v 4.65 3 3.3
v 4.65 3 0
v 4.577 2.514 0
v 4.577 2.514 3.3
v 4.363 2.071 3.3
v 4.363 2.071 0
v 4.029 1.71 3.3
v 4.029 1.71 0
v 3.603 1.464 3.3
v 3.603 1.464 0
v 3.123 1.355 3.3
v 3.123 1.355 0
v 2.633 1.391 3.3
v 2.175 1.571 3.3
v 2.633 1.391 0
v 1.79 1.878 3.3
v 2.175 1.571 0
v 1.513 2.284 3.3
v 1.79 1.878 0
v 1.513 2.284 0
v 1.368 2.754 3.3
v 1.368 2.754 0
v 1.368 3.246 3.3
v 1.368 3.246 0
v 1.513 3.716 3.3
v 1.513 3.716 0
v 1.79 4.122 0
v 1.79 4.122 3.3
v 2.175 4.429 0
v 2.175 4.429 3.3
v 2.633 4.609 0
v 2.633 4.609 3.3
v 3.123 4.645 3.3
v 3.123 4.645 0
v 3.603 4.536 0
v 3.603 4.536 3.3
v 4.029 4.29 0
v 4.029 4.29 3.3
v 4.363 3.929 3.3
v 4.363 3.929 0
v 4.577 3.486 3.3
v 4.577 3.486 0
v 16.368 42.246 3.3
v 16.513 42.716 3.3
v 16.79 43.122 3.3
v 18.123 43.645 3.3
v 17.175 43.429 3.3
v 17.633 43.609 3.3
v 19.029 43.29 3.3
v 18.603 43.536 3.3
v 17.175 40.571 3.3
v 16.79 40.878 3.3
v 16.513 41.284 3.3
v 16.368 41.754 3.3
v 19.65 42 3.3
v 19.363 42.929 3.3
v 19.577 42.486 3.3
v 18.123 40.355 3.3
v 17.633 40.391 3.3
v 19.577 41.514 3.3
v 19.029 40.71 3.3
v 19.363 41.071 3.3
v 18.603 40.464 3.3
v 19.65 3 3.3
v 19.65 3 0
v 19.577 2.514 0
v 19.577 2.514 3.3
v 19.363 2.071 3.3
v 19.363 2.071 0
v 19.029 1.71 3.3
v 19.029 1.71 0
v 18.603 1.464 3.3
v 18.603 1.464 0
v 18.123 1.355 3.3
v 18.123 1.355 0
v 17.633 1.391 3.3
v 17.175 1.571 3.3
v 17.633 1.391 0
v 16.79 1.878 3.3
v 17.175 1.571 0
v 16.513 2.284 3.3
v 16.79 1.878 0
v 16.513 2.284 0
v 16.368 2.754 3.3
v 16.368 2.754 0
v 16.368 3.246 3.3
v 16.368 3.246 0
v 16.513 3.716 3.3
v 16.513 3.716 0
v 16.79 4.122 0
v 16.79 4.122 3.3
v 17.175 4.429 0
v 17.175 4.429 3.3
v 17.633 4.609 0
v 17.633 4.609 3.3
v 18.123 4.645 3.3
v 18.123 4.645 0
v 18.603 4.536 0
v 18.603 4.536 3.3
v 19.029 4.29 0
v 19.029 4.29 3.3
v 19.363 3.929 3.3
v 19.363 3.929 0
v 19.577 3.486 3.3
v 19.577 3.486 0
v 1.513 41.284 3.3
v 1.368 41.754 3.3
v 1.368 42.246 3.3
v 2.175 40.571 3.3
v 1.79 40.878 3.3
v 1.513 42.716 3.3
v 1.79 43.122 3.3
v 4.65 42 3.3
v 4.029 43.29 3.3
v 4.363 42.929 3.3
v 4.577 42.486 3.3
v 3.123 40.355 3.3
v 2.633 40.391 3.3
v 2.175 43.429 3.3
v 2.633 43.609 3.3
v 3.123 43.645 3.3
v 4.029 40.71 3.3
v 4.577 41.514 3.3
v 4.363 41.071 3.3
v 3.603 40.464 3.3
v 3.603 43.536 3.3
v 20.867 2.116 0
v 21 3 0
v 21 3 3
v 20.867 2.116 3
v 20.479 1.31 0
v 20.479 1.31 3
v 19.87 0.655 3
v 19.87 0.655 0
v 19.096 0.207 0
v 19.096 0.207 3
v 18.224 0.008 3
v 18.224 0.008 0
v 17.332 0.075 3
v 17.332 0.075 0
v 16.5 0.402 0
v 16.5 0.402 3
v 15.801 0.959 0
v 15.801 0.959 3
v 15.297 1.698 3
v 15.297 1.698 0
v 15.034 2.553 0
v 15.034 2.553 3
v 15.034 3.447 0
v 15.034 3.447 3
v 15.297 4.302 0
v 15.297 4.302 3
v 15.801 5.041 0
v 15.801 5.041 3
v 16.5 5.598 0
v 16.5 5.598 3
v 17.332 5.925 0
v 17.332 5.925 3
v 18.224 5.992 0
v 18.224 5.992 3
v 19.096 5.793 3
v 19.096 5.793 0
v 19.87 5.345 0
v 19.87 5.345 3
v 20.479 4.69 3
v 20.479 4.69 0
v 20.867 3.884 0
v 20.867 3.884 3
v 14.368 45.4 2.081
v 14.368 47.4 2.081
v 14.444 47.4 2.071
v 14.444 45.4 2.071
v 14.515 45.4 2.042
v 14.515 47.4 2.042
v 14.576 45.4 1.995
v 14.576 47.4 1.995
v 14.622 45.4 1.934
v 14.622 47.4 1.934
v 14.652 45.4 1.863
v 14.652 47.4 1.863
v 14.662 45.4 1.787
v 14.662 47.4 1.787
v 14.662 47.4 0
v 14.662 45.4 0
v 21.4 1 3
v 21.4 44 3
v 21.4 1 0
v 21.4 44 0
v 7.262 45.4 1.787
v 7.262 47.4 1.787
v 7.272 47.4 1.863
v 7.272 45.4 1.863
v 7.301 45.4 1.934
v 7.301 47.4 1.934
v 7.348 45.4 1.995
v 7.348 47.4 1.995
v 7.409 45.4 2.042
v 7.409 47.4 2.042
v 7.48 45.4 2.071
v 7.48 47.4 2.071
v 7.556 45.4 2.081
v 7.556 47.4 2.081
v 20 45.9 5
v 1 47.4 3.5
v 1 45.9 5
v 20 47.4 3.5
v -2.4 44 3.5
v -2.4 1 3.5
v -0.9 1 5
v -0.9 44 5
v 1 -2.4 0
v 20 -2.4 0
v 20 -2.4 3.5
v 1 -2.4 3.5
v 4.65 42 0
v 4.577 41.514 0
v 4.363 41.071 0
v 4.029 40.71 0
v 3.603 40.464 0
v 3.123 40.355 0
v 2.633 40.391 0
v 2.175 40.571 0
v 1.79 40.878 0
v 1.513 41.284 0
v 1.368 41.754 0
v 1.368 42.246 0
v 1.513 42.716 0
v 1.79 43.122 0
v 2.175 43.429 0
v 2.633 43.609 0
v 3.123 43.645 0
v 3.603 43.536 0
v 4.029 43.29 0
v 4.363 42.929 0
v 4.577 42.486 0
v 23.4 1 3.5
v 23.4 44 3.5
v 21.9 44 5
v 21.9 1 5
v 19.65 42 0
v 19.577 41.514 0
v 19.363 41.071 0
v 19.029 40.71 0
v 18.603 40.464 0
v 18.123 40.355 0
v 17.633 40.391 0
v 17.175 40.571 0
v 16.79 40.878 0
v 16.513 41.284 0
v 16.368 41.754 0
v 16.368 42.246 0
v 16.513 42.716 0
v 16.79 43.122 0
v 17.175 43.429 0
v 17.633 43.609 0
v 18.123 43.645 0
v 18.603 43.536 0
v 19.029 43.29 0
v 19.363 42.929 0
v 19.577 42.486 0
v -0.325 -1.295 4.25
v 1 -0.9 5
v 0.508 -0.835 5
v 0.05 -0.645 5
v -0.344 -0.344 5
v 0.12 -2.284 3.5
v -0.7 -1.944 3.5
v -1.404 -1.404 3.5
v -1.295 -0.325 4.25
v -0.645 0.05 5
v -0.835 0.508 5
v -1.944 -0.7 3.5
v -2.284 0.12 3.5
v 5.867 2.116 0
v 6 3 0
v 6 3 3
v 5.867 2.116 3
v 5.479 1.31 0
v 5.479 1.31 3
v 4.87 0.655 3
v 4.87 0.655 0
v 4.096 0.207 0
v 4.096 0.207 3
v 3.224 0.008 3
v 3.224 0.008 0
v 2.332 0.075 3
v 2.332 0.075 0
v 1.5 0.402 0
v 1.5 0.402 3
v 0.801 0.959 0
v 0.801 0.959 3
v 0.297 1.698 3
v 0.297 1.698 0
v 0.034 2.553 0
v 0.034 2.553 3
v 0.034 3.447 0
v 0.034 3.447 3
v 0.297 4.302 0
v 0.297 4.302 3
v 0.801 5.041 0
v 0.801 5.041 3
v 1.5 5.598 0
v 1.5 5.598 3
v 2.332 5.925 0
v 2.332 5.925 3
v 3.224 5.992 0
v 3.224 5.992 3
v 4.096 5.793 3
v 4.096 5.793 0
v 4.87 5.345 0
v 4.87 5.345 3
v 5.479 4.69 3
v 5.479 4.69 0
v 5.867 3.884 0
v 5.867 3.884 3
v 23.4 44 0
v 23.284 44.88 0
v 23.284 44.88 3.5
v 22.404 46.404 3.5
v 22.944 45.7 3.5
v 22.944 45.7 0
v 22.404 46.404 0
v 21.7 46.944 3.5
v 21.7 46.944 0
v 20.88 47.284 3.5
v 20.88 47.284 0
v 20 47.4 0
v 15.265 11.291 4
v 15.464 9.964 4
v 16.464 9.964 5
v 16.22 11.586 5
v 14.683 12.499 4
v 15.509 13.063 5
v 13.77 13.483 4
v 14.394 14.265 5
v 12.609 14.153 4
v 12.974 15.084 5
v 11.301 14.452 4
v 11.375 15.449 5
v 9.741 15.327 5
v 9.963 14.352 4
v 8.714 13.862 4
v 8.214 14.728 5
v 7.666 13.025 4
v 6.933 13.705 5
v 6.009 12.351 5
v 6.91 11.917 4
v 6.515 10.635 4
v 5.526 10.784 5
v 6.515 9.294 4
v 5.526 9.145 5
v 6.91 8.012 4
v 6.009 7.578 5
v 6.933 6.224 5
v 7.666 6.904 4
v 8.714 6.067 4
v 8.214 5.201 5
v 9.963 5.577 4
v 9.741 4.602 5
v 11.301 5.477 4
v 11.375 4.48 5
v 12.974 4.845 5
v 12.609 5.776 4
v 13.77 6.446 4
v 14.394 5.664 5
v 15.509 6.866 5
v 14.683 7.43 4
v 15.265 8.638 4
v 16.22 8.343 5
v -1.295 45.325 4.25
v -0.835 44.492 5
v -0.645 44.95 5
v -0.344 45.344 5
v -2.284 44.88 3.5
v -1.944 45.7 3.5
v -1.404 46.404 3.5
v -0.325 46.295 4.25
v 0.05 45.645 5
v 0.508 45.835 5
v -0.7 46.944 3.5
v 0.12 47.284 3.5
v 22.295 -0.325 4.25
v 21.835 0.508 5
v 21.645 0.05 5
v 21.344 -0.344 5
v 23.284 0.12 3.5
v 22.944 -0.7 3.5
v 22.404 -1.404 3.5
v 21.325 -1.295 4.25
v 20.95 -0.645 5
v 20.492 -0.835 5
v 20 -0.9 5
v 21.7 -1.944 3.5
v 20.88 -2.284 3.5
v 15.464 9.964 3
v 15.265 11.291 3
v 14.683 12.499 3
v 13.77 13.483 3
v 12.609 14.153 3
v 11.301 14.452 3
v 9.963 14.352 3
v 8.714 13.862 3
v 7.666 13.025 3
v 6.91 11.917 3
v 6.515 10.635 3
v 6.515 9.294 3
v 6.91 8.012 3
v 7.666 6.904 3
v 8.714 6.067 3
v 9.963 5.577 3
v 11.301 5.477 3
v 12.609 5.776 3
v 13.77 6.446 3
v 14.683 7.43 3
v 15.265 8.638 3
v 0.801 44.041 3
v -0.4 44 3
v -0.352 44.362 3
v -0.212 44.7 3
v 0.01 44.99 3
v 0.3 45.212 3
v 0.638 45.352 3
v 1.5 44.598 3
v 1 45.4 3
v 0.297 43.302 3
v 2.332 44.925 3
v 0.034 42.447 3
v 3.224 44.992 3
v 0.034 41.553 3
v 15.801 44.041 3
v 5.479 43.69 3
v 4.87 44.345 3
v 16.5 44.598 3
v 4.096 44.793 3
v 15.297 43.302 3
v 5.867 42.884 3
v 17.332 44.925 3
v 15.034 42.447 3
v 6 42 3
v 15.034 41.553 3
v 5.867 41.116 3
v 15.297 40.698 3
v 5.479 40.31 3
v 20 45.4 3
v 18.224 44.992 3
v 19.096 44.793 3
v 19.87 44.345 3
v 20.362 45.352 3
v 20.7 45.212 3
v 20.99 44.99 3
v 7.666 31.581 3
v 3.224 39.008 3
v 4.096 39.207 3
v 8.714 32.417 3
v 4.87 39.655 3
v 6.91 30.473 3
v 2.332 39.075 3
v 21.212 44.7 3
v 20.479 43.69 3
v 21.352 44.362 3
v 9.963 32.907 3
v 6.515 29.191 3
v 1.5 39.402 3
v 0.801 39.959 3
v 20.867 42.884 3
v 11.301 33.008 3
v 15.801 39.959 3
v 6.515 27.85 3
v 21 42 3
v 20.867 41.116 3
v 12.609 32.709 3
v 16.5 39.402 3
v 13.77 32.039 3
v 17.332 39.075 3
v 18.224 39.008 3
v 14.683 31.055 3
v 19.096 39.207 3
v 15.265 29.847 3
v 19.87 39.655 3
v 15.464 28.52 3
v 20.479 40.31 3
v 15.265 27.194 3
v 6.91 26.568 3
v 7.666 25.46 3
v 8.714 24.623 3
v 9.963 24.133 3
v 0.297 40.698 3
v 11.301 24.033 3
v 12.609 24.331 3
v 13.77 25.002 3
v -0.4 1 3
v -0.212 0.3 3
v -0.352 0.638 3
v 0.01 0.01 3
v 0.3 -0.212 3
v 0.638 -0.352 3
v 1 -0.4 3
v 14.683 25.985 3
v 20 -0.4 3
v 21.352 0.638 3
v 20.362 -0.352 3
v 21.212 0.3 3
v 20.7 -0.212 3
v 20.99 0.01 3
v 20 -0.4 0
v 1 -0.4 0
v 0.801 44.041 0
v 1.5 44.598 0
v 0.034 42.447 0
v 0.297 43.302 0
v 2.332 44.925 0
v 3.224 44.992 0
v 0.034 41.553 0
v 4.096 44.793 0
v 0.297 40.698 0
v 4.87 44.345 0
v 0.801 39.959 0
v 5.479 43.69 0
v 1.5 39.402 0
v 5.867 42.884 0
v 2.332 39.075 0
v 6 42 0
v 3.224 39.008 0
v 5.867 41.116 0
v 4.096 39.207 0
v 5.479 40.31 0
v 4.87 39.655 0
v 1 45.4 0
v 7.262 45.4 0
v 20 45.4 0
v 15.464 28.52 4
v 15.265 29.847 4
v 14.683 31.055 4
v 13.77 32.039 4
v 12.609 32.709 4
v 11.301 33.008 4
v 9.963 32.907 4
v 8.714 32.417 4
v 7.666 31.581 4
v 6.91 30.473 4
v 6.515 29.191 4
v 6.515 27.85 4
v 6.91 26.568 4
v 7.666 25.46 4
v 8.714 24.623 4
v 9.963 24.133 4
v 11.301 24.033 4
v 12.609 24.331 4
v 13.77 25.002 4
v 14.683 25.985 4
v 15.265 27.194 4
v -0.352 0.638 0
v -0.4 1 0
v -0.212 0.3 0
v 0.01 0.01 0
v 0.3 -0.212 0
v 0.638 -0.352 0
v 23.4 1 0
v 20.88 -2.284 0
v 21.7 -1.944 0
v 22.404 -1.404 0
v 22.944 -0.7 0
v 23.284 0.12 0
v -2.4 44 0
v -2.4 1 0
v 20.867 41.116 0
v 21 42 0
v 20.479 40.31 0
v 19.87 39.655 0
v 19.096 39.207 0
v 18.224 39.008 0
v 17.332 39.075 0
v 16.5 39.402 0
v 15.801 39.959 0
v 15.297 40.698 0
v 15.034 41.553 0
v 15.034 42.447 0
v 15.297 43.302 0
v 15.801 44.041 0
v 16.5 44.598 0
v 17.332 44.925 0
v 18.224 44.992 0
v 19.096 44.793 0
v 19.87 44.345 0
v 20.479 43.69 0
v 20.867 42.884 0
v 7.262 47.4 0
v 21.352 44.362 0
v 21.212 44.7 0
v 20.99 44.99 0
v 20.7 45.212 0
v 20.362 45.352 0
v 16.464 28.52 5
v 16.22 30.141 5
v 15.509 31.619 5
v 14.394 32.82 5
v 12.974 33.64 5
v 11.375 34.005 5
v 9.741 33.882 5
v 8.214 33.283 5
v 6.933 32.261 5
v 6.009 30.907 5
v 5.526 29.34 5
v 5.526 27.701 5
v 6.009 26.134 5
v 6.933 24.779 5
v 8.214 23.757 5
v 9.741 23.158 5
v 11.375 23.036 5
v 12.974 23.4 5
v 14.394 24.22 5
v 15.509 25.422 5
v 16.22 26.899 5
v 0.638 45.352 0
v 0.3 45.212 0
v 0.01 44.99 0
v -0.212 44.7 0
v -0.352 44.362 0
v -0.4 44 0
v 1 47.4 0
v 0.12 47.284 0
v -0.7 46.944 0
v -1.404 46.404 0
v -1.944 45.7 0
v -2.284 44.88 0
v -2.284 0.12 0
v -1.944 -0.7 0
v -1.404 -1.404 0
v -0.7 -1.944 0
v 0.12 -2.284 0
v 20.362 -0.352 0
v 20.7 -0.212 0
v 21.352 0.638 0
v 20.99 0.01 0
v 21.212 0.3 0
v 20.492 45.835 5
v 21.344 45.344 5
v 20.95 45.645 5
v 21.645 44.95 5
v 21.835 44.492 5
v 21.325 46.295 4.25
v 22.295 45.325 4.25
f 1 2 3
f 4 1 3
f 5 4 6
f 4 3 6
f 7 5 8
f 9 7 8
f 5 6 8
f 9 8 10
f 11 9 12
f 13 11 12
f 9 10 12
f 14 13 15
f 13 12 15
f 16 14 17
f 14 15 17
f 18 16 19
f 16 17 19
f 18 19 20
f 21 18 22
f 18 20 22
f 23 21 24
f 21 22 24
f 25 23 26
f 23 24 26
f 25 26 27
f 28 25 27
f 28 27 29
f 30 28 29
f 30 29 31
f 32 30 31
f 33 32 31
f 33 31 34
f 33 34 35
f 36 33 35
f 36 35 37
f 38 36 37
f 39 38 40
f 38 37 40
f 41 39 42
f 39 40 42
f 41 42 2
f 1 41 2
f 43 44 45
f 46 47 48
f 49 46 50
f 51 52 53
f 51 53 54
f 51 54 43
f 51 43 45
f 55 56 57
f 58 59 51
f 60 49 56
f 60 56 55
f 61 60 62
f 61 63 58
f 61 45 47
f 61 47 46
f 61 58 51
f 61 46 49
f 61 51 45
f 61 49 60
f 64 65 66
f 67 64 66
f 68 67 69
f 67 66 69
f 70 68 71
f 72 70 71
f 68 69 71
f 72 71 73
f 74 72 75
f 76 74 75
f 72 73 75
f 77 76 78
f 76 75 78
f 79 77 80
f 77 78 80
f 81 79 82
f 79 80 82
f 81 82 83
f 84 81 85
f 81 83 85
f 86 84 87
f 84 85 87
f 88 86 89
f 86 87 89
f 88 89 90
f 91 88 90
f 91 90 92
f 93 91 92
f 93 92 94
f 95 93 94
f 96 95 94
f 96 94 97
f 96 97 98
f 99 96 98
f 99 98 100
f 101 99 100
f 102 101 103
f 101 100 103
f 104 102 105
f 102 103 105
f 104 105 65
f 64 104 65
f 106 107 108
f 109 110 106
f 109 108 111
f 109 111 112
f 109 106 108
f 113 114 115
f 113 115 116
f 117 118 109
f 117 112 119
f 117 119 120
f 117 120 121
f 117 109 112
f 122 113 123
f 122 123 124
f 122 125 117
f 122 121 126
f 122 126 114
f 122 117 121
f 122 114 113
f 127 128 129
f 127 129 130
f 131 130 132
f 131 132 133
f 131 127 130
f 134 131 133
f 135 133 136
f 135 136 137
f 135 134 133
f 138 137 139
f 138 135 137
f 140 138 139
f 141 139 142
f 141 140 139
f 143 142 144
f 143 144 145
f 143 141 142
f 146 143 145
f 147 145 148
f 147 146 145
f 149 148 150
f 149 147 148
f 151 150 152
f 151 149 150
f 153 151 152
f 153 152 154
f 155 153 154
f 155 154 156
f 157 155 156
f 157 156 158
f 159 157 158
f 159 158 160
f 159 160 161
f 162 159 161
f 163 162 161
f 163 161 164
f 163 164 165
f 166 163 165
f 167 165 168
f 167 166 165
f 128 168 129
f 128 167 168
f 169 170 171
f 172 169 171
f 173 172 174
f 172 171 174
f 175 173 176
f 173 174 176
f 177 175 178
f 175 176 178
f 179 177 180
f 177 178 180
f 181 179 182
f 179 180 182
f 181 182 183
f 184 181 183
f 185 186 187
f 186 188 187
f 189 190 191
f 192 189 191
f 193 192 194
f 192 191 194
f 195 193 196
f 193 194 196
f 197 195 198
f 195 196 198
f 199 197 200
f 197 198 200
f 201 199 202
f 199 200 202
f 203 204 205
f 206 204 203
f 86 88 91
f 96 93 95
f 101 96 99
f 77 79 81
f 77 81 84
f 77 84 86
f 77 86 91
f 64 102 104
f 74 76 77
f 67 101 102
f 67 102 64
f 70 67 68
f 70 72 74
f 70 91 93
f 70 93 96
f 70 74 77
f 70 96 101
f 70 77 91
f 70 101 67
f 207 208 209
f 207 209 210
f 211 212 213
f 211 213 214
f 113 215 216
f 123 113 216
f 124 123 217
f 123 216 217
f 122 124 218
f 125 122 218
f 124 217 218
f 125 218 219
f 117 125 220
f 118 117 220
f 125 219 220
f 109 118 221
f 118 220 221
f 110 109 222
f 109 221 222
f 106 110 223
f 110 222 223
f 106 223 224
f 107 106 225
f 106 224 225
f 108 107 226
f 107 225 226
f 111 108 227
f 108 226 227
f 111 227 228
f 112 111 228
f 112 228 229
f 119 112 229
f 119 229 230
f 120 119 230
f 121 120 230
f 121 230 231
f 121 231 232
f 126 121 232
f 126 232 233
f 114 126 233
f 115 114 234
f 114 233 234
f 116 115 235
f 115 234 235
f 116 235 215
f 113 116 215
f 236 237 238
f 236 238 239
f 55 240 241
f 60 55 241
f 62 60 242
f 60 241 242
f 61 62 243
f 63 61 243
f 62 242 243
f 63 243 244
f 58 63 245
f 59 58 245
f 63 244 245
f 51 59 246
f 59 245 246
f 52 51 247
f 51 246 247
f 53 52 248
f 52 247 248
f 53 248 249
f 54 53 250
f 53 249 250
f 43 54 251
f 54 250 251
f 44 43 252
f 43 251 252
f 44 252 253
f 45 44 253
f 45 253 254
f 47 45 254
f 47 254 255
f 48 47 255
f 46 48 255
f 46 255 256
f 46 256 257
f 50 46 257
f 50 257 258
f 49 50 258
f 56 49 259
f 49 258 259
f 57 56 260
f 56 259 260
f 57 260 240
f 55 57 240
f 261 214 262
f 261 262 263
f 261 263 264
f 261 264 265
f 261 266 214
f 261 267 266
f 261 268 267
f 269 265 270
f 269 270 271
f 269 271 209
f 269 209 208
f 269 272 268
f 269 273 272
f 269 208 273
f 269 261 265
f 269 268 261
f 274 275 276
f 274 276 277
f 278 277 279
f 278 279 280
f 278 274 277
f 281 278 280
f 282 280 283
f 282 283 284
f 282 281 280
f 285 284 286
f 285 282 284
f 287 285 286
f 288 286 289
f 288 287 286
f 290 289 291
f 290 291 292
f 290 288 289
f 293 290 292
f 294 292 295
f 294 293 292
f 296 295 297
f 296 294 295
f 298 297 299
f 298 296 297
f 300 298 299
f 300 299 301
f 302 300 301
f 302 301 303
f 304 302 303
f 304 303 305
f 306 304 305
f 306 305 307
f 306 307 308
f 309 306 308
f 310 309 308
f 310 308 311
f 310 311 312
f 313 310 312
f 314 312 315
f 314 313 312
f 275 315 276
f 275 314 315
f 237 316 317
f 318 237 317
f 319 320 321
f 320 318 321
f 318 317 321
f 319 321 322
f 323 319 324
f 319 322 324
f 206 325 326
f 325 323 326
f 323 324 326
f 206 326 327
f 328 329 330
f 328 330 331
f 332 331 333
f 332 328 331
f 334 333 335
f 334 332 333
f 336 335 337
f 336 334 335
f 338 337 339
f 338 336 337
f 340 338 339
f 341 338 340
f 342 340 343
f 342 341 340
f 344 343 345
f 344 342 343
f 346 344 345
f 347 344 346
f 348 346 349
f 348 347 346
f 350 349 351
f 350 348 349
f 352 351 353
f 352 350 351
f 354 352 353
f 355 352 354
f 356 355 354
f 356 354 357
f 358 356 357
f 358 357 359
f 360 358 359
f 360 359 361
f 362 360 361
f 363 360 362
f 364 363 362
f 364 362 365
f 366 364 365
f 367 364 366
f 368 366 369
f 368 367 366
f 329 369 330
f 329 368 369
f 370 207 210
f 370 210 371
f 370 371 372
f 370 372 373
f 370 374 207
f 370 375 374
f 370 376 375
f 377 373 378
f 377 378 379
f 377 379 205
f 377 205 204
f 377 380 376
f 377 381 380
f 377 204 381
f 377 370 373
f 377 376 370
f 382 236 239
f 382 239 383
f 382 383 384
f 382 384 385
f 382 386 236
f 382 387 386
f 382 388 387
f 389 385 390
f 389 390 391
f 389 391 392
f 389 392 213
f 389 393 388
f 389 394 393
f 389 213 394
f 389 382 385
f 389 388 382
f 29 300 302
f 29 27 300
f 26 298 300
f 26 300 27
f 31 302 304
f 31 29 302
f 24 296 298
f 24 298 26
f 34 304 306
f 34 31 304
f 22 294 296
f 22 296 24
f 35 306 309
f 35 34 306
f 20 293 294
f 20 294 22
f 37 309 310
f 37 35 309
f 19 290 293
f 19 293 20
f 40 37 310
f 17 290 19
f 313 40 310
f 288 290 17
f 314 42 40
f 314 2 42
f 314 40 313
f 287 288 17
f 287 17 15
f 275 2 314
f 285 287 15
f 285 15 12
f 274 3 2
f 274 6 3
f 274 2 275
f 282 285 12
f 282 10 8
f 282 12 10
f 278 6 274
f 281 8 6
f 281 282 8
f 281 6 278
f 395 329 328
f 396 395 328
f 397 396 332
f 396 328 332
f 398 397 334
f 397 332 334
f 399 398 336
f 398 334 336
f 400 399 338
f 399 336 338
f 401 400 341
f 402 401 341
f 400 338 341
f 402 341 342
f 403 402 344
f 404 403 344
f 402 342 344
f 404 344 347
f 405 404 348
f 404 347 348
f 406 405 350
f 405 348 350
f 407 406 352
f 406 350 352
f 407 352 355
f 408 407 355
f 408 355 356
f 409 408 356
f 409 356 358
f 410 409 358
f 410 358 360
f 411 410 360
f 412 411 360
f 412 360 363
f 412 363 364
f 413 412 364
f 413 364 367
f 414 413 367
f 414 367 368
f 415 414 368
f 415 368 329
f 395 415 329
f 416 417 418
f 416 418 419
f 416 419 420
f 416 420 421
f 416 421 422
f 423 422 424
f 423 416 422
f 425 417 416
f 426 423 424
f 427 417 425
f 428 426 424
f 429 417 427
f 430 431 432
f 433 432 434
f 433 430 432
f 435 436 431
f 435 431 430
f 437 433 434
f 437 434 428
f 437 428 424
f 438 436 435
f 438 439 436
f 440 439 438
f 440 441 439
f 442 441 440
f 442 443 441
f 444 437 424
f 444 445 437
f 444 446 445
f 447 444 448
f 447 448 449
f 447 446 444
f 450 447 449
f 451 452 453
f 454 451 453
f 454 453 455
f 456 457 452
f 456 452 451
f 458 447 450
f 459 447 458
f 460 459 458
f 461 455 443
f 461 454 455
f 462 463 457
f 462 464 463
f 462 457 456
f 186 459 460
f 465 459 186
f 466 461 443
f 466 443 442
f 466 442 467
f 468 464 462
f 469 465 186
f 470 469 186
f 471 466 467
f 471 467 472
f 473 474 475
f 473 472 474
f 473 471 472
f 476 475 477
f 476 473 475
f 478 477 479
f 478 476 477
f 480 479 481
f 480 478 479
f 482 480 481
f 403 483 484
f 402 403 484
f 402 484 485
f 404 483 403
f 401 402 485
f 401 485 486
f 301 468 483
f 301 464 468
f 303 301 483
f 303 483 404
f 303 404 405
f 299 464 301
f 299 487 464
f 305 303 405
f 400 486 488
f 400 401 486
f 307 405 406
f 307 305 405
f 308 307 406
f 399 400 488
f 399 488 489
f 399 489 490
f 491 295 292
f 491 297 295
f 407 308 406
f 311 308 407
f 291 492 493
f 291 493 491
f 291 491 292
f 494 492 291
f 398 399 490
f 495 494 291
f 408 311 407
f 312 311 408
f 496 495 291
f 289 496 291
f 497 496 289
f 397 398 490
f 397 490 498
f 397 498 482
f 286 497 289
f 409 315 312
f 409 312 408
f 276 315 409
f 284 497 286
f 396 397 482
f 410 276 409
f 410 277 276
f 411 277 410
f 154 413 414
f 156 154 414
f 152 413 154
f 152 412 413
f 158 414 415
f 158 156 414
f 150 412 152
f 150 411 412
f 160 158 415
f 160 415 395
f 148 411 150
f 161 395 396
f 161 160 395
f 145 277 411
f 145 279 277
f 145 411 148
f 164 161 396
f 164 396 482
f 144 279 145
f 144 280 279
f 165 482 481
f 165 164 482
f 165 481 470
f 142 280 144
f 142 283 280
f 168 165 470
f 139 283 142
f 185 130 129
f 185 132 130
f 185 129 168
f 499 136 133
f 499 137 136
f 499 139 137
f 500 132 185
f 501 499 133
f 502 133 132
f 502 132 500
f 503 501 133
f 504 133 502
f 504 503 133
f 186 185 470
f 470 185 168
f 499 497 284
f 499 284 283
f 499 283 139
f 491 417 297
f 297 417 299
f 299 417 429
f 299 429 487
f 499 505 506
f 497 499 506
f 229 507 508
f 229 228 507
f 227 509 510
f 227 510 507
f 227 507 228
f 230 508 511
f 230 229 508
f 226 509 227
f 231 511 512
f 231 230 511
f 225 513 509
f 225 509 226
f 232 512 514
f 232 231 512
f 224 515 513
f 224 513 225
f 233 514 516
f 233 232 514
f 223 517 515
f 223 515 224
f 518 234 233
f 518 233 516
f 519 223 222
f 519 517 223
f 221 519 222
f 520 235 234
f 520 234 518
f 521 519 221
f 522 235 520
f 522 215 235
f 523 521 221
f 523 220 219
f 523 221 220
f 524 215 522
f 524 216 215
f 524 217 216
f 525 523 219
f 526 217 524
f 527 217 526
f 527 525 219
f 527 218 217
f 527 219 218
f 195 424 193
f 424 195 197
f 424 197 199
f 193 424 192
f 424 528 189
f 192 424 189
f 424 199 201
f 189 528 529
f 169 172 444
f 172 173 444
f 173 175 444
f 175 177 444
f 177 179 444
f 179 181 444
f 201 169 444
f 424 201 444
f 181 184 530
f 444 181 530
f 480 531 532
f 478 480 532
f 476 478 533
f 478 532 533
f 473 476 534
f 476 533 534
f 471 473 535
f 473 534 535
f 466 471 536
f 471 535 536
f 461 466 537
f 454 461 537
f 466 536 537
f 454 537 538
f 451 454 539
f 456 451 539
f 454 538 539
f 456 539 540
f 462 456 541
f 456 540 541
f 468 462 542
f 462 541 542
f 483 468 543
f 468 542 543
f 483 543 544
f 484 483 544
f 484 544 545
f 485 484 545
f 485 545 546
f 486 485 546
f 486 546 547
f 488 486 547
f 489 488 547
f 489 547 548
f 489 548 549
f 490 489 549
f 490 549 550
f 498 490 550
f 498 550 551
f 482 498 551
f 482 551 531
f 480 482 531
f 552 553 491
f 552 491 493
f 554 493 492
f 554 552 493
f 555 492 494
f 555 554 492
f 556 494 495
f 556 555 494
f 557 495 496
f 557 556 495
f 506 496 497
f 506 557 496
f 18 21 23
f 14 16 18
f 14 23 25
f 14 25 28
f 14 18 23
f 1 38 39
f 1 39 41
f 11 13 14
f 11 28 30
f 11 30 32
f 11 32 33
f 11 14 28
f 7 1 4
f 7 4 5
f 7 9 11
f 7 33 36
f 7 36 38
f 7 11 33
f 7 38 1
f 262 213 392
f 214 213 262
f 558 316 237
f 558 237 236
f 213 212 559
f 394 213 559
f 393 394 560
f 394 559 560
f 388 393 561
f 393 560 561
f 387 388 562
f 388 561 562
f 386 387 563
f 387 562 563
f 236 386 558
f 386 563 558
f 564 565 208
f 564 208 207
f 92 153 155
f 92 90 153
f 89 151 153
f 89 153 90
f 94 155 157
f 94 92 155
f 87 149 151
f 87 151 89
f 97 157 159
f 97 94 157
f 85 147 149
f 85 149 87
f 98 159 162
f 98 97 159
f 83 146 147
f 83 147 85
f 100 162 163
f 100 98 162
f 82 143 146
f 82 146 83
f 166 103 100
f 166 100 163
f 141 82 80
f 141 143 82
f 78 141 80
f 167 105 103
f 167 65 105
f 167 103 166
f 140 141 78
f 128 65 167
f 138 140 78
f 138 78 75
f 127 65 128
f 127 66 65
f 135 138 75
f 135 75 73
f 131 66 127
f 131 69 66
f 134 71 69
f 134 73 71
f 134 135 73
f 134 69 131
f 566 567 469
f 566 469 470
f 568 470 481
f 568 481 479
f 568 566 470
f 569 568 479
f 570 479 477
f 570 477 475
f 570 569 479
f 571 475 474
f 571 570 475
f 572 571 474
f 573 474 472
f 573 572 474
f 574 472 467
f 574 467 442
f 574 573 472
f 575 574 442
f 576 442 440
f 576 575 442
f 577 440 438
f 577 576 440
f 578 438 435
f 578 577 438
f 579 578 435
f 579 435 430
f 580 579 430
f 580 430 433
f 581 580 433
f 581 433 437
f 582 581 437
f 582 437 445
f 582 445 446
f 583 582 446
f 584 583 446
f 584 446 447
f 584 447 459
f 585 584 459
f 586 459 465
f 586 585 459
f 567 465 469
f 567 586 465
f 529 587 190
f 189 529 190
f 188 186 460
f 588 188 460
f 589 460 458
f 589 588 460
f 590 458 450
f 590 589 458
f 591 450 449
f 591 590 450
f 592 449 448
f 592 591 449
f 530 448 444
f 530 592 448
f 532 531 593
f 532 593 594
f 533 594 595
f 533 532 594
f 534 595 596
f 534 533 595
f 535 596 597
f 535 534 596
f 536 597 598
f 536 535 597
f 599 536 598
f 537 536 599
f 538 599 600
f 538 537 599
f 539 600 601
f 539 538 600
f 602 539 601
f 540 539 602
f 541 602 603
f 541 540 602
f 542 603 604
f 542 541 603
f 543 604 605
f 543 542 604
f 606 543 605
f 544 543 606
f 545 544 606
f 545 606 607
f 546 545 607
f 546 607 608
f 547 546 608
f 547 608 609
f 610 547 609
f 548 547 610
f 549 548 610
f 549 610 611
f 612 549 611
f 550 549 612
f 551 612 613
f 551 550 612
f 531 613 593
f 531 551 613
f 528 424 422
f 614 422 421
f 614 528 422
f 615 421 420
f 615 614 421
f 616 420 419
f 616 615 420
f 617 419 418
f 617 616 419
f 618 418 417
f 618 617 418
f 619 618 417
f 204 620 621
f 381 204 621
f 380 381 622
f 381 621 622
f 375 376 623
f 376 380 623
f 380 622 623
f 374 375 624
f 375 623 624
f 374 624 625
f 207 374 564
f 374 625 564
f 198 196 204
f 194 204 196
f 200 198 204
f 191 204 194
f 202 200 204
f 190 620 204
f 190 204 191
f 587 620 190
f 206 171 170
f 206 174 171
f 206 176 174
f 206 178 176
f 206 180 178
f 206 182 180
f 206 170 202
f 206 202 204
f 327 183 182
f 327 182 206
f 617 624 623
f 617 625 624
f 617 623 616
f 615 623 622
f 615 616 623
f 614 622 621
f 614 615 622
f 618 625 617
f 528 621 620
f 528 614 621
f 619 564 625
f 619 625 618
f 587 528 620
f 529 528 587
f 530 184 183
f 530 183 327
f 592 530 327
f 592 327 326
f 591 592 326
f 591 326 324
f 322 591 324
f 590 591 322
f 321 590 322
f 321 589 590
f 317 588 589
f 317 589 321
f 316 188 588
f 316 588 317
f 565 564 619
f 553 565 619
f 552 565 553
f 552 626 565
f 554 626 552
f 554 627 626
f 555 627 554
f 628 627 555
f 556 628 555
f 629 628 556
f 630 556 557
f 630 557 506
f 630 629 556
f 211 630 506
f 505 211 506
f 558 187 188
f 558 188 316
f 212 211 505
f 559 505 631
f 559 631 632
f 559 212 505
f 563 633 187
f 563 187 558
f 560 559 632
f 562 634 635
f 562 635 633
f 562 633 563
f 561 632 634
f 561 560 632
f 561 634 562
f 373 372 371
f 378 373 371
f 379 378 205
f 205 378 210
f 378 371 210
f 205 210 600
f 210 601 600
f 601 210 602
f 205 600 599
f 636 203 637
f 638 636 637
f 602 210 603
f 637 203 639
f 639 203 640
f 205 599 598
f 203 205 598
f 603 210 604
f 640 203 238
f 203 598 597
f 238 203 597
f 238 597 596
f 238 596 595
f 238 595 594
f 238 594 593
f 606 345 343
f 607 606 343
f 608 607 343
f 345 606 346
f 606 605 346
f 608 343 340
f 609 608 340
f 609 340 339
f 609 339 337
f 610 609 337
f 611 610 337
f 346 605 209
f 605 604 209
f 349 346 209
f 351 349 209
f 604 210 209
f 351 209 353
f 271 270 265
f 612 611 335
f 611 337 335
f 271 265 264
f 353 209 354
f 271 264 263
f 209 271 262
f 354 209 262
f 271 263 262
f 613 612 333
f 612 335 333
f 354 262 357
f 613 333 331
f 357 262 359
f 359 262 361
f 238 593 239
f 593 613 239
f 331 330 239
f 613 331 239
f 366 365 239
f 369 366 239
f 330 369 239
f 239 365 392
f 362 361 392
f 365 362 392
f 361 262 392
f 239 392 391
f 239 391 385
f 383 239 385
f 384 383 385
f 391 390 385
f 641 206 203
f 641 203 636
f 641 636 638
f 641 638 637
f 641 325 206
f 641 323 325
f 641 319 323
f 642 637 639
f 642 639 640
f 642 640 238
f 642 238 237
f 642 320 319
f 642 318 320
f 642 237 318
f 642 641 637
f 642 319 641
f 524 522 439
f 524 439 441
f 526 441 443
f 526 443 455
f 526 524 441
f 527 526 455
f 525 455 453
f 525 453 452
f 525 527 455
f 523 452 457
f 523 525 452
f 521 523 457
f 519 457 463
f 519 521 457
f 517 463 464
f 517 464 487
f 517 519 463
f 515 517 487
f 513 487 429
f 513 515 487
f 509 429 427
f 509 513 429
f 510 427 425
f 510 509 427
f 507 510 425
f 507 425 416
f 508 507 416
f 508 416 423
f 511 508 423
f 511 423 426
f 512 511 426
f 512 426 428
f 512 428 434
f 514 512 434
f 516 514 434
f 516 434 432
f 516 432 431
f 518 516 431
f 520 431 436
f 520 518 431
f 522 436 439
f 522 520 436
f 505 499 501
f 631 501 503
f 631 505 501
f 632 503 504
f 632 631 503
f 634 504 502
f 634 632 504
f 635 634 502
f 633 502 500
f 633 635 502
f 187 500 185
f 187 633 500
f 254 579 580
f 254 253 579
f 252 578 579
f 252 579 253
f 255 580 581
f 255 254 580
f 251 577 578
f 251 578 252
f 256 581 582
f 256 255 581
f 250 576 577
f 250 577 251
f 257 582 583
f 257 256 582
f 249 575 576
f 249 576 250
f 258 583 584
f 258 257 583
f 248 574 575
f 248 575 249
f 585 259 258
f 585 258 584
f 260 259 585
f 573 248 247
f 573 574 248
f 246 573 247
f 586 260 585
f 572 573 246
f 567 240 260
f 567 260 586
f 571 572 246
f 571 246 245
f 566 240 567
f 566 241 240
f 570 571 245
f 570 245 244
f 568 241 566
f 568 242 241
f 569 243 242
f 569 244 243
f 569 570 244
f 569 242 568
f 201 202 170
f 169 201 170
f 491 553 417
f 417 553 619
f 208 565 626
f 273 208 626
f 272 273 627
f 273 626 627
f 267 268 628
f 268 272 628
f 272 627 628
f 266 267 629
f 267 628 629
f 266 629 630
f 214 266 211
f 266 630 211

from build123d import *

# Parameters (mm, degrees)
PAD014_DEPTH    = 5
THICKNESS001_T  = -2
SKETCH029_R     = 4.5
POCKET011_DEPTH = 5.001
SKETCH030_R     = 3
PAD015_DEPTH    = 3
SKETCH031_R     = 1.65
POCKET012_DEPTH = 3.3
POCKET_DEPTH    = 2
CHAMFER_SIZE    = 1
CHAMFER002_SIZE = 1.5


with BuildPart() as part:
    # Sketch027 → Pad014 (new body)
    with BuildSketch(Plane(origin=(0, 0, 0), x_dir=(-1, 0, 0), z_dir=(0, 0, 1))):
        with BuildLine():
            Line((-23.4, -44.000002), (-23.4, -1))
            ThreePointArc((-20, 2.4), (-22.404163, 1.404163), (-23.4, -1))
            Line((-20, 2.4), (-1, 2.4))
            ThreePointArc((2.4, -1), (1.404163, 1.404163), (-1, 2.4))
            Line((2.4, -1), (2.4, -44.000001))
            ThreePointArc((-0.999999, -47.4), (1.404163, -46.404163), (2.4, -44.000001))
            Line((-0.999999, -47.4), (-20.000001, -47.4))
            ThreePointArc((-23.4, -44.000002), (-22.404163, -46.404164), (-20.000001, -47.4))
        make_face()
    extrude(amount=PAD014_DEPTH)

    # Thickness001
    thickness001_openings = [part.faces().sort_by_distance(p)[0] for p in [
        (10.5, 22.5, 0),
    ]]
    offset(amount=THICKNESS001_T, openings=thickness001_openings)

    # Sketch029 (on Face9 of Thickness001) → Pocket011 (cut, through all)
    with BuildSketch(Plane.XY.offset(5)):
        with Locations((10.964466, 9.964466)):
            Circle(SKETCH029_R)
        with Locations((10.964466, 28.52028)):
            Circle(SKETCH029_R)
    extrude(amount=-POCKET011_DEPTH, mode=Mode.SUBTRACT)

    # Sketch030 (on Face4 of Pocket011) → Pad015 (join)
    with BuildSketch(Plane(origin=(0, 0, 0), x_dir=(1, 0, 0), z_dir=(0, 0, -1))):
        with Locations((3, -3)):
            Circle(SKETCH030_R)
        with Locations((18, -3)):
            Circle(SKETCH030_R)
        with Locations((18, -42)):
            Circle(SKETCH030_R)
        with Locations((3, -42)):
            Circle(SKETCH030_R)
    extrude(amount=-PAD015_DEPTH)

    # Sketch031 (on Face27 of Pad015) → Pocket012 (cut)
    with BuildSketch(Plane(origin=(0, 0, 0), x_dir=(1, 0, 0), z_dir=(0, 0, -1))):
        with Locations((3, -3)):
            Circle(SKETCH031_R)
        with Locations((18, -3)):
            Circle(SKETCH031_R)
        with Locations((18, -42)):
            Circle(SKETCH031_R)
        with Locations((3, -42)):
            Circle(SKETCH031_R)
    extrude(amount=-POCKET012_DEPTH, mode=Mode.SUBTRACT)

    # Sketch033 (on Face6 of Pocket012) → Pocket (cut)
    with BuildSketch(Plane(origin=(0, 47.4, 0), x_dir=(-1, 0, 0), z_dir=(0, 1, 0))):
        with BuildLine():
            Line((-14.661912, 0), (-7.262061, 0))
            Line((-7.262061, 0), (-7.262061, 1.787056))
            ThreePointArc((-7.262061, 1.787056), (-7.348276, 1.995197), (-7.556417, 2.081412))
            Line((-7.556417, 2.081412), (-14.367556, 2.081412))
            ThreePointArc((-14.367556, 2.081412), (-14.575697, 1.995197), (-14.661912, 1.787056))
            Line((-14.661912, 1.787056), (-14.661912, 0))
        make_face()
    extrude(amount=-POCKET_DEPTH, mode=Mode.SUBTRACT)

    # Chamfer
    chamfer_edges = [part.edges().sort_by_distance(p)[0] for p in [
        (6.464466, 28.52028, 5),
        (6.464466, 9.964466, 5),
    ]]
    chamfer(chamfer_edges, length=CHAMFER_SIZE)

    # Chamfer002
    chamfer002_edges = [part.edges().sort_by_distance(p)[0] for p in [
        (10.5, 47.4, 5),
    ]]
    chamfer(chamfer002_edges, length=CHAMFER002_SIZE)


solid = part.part
